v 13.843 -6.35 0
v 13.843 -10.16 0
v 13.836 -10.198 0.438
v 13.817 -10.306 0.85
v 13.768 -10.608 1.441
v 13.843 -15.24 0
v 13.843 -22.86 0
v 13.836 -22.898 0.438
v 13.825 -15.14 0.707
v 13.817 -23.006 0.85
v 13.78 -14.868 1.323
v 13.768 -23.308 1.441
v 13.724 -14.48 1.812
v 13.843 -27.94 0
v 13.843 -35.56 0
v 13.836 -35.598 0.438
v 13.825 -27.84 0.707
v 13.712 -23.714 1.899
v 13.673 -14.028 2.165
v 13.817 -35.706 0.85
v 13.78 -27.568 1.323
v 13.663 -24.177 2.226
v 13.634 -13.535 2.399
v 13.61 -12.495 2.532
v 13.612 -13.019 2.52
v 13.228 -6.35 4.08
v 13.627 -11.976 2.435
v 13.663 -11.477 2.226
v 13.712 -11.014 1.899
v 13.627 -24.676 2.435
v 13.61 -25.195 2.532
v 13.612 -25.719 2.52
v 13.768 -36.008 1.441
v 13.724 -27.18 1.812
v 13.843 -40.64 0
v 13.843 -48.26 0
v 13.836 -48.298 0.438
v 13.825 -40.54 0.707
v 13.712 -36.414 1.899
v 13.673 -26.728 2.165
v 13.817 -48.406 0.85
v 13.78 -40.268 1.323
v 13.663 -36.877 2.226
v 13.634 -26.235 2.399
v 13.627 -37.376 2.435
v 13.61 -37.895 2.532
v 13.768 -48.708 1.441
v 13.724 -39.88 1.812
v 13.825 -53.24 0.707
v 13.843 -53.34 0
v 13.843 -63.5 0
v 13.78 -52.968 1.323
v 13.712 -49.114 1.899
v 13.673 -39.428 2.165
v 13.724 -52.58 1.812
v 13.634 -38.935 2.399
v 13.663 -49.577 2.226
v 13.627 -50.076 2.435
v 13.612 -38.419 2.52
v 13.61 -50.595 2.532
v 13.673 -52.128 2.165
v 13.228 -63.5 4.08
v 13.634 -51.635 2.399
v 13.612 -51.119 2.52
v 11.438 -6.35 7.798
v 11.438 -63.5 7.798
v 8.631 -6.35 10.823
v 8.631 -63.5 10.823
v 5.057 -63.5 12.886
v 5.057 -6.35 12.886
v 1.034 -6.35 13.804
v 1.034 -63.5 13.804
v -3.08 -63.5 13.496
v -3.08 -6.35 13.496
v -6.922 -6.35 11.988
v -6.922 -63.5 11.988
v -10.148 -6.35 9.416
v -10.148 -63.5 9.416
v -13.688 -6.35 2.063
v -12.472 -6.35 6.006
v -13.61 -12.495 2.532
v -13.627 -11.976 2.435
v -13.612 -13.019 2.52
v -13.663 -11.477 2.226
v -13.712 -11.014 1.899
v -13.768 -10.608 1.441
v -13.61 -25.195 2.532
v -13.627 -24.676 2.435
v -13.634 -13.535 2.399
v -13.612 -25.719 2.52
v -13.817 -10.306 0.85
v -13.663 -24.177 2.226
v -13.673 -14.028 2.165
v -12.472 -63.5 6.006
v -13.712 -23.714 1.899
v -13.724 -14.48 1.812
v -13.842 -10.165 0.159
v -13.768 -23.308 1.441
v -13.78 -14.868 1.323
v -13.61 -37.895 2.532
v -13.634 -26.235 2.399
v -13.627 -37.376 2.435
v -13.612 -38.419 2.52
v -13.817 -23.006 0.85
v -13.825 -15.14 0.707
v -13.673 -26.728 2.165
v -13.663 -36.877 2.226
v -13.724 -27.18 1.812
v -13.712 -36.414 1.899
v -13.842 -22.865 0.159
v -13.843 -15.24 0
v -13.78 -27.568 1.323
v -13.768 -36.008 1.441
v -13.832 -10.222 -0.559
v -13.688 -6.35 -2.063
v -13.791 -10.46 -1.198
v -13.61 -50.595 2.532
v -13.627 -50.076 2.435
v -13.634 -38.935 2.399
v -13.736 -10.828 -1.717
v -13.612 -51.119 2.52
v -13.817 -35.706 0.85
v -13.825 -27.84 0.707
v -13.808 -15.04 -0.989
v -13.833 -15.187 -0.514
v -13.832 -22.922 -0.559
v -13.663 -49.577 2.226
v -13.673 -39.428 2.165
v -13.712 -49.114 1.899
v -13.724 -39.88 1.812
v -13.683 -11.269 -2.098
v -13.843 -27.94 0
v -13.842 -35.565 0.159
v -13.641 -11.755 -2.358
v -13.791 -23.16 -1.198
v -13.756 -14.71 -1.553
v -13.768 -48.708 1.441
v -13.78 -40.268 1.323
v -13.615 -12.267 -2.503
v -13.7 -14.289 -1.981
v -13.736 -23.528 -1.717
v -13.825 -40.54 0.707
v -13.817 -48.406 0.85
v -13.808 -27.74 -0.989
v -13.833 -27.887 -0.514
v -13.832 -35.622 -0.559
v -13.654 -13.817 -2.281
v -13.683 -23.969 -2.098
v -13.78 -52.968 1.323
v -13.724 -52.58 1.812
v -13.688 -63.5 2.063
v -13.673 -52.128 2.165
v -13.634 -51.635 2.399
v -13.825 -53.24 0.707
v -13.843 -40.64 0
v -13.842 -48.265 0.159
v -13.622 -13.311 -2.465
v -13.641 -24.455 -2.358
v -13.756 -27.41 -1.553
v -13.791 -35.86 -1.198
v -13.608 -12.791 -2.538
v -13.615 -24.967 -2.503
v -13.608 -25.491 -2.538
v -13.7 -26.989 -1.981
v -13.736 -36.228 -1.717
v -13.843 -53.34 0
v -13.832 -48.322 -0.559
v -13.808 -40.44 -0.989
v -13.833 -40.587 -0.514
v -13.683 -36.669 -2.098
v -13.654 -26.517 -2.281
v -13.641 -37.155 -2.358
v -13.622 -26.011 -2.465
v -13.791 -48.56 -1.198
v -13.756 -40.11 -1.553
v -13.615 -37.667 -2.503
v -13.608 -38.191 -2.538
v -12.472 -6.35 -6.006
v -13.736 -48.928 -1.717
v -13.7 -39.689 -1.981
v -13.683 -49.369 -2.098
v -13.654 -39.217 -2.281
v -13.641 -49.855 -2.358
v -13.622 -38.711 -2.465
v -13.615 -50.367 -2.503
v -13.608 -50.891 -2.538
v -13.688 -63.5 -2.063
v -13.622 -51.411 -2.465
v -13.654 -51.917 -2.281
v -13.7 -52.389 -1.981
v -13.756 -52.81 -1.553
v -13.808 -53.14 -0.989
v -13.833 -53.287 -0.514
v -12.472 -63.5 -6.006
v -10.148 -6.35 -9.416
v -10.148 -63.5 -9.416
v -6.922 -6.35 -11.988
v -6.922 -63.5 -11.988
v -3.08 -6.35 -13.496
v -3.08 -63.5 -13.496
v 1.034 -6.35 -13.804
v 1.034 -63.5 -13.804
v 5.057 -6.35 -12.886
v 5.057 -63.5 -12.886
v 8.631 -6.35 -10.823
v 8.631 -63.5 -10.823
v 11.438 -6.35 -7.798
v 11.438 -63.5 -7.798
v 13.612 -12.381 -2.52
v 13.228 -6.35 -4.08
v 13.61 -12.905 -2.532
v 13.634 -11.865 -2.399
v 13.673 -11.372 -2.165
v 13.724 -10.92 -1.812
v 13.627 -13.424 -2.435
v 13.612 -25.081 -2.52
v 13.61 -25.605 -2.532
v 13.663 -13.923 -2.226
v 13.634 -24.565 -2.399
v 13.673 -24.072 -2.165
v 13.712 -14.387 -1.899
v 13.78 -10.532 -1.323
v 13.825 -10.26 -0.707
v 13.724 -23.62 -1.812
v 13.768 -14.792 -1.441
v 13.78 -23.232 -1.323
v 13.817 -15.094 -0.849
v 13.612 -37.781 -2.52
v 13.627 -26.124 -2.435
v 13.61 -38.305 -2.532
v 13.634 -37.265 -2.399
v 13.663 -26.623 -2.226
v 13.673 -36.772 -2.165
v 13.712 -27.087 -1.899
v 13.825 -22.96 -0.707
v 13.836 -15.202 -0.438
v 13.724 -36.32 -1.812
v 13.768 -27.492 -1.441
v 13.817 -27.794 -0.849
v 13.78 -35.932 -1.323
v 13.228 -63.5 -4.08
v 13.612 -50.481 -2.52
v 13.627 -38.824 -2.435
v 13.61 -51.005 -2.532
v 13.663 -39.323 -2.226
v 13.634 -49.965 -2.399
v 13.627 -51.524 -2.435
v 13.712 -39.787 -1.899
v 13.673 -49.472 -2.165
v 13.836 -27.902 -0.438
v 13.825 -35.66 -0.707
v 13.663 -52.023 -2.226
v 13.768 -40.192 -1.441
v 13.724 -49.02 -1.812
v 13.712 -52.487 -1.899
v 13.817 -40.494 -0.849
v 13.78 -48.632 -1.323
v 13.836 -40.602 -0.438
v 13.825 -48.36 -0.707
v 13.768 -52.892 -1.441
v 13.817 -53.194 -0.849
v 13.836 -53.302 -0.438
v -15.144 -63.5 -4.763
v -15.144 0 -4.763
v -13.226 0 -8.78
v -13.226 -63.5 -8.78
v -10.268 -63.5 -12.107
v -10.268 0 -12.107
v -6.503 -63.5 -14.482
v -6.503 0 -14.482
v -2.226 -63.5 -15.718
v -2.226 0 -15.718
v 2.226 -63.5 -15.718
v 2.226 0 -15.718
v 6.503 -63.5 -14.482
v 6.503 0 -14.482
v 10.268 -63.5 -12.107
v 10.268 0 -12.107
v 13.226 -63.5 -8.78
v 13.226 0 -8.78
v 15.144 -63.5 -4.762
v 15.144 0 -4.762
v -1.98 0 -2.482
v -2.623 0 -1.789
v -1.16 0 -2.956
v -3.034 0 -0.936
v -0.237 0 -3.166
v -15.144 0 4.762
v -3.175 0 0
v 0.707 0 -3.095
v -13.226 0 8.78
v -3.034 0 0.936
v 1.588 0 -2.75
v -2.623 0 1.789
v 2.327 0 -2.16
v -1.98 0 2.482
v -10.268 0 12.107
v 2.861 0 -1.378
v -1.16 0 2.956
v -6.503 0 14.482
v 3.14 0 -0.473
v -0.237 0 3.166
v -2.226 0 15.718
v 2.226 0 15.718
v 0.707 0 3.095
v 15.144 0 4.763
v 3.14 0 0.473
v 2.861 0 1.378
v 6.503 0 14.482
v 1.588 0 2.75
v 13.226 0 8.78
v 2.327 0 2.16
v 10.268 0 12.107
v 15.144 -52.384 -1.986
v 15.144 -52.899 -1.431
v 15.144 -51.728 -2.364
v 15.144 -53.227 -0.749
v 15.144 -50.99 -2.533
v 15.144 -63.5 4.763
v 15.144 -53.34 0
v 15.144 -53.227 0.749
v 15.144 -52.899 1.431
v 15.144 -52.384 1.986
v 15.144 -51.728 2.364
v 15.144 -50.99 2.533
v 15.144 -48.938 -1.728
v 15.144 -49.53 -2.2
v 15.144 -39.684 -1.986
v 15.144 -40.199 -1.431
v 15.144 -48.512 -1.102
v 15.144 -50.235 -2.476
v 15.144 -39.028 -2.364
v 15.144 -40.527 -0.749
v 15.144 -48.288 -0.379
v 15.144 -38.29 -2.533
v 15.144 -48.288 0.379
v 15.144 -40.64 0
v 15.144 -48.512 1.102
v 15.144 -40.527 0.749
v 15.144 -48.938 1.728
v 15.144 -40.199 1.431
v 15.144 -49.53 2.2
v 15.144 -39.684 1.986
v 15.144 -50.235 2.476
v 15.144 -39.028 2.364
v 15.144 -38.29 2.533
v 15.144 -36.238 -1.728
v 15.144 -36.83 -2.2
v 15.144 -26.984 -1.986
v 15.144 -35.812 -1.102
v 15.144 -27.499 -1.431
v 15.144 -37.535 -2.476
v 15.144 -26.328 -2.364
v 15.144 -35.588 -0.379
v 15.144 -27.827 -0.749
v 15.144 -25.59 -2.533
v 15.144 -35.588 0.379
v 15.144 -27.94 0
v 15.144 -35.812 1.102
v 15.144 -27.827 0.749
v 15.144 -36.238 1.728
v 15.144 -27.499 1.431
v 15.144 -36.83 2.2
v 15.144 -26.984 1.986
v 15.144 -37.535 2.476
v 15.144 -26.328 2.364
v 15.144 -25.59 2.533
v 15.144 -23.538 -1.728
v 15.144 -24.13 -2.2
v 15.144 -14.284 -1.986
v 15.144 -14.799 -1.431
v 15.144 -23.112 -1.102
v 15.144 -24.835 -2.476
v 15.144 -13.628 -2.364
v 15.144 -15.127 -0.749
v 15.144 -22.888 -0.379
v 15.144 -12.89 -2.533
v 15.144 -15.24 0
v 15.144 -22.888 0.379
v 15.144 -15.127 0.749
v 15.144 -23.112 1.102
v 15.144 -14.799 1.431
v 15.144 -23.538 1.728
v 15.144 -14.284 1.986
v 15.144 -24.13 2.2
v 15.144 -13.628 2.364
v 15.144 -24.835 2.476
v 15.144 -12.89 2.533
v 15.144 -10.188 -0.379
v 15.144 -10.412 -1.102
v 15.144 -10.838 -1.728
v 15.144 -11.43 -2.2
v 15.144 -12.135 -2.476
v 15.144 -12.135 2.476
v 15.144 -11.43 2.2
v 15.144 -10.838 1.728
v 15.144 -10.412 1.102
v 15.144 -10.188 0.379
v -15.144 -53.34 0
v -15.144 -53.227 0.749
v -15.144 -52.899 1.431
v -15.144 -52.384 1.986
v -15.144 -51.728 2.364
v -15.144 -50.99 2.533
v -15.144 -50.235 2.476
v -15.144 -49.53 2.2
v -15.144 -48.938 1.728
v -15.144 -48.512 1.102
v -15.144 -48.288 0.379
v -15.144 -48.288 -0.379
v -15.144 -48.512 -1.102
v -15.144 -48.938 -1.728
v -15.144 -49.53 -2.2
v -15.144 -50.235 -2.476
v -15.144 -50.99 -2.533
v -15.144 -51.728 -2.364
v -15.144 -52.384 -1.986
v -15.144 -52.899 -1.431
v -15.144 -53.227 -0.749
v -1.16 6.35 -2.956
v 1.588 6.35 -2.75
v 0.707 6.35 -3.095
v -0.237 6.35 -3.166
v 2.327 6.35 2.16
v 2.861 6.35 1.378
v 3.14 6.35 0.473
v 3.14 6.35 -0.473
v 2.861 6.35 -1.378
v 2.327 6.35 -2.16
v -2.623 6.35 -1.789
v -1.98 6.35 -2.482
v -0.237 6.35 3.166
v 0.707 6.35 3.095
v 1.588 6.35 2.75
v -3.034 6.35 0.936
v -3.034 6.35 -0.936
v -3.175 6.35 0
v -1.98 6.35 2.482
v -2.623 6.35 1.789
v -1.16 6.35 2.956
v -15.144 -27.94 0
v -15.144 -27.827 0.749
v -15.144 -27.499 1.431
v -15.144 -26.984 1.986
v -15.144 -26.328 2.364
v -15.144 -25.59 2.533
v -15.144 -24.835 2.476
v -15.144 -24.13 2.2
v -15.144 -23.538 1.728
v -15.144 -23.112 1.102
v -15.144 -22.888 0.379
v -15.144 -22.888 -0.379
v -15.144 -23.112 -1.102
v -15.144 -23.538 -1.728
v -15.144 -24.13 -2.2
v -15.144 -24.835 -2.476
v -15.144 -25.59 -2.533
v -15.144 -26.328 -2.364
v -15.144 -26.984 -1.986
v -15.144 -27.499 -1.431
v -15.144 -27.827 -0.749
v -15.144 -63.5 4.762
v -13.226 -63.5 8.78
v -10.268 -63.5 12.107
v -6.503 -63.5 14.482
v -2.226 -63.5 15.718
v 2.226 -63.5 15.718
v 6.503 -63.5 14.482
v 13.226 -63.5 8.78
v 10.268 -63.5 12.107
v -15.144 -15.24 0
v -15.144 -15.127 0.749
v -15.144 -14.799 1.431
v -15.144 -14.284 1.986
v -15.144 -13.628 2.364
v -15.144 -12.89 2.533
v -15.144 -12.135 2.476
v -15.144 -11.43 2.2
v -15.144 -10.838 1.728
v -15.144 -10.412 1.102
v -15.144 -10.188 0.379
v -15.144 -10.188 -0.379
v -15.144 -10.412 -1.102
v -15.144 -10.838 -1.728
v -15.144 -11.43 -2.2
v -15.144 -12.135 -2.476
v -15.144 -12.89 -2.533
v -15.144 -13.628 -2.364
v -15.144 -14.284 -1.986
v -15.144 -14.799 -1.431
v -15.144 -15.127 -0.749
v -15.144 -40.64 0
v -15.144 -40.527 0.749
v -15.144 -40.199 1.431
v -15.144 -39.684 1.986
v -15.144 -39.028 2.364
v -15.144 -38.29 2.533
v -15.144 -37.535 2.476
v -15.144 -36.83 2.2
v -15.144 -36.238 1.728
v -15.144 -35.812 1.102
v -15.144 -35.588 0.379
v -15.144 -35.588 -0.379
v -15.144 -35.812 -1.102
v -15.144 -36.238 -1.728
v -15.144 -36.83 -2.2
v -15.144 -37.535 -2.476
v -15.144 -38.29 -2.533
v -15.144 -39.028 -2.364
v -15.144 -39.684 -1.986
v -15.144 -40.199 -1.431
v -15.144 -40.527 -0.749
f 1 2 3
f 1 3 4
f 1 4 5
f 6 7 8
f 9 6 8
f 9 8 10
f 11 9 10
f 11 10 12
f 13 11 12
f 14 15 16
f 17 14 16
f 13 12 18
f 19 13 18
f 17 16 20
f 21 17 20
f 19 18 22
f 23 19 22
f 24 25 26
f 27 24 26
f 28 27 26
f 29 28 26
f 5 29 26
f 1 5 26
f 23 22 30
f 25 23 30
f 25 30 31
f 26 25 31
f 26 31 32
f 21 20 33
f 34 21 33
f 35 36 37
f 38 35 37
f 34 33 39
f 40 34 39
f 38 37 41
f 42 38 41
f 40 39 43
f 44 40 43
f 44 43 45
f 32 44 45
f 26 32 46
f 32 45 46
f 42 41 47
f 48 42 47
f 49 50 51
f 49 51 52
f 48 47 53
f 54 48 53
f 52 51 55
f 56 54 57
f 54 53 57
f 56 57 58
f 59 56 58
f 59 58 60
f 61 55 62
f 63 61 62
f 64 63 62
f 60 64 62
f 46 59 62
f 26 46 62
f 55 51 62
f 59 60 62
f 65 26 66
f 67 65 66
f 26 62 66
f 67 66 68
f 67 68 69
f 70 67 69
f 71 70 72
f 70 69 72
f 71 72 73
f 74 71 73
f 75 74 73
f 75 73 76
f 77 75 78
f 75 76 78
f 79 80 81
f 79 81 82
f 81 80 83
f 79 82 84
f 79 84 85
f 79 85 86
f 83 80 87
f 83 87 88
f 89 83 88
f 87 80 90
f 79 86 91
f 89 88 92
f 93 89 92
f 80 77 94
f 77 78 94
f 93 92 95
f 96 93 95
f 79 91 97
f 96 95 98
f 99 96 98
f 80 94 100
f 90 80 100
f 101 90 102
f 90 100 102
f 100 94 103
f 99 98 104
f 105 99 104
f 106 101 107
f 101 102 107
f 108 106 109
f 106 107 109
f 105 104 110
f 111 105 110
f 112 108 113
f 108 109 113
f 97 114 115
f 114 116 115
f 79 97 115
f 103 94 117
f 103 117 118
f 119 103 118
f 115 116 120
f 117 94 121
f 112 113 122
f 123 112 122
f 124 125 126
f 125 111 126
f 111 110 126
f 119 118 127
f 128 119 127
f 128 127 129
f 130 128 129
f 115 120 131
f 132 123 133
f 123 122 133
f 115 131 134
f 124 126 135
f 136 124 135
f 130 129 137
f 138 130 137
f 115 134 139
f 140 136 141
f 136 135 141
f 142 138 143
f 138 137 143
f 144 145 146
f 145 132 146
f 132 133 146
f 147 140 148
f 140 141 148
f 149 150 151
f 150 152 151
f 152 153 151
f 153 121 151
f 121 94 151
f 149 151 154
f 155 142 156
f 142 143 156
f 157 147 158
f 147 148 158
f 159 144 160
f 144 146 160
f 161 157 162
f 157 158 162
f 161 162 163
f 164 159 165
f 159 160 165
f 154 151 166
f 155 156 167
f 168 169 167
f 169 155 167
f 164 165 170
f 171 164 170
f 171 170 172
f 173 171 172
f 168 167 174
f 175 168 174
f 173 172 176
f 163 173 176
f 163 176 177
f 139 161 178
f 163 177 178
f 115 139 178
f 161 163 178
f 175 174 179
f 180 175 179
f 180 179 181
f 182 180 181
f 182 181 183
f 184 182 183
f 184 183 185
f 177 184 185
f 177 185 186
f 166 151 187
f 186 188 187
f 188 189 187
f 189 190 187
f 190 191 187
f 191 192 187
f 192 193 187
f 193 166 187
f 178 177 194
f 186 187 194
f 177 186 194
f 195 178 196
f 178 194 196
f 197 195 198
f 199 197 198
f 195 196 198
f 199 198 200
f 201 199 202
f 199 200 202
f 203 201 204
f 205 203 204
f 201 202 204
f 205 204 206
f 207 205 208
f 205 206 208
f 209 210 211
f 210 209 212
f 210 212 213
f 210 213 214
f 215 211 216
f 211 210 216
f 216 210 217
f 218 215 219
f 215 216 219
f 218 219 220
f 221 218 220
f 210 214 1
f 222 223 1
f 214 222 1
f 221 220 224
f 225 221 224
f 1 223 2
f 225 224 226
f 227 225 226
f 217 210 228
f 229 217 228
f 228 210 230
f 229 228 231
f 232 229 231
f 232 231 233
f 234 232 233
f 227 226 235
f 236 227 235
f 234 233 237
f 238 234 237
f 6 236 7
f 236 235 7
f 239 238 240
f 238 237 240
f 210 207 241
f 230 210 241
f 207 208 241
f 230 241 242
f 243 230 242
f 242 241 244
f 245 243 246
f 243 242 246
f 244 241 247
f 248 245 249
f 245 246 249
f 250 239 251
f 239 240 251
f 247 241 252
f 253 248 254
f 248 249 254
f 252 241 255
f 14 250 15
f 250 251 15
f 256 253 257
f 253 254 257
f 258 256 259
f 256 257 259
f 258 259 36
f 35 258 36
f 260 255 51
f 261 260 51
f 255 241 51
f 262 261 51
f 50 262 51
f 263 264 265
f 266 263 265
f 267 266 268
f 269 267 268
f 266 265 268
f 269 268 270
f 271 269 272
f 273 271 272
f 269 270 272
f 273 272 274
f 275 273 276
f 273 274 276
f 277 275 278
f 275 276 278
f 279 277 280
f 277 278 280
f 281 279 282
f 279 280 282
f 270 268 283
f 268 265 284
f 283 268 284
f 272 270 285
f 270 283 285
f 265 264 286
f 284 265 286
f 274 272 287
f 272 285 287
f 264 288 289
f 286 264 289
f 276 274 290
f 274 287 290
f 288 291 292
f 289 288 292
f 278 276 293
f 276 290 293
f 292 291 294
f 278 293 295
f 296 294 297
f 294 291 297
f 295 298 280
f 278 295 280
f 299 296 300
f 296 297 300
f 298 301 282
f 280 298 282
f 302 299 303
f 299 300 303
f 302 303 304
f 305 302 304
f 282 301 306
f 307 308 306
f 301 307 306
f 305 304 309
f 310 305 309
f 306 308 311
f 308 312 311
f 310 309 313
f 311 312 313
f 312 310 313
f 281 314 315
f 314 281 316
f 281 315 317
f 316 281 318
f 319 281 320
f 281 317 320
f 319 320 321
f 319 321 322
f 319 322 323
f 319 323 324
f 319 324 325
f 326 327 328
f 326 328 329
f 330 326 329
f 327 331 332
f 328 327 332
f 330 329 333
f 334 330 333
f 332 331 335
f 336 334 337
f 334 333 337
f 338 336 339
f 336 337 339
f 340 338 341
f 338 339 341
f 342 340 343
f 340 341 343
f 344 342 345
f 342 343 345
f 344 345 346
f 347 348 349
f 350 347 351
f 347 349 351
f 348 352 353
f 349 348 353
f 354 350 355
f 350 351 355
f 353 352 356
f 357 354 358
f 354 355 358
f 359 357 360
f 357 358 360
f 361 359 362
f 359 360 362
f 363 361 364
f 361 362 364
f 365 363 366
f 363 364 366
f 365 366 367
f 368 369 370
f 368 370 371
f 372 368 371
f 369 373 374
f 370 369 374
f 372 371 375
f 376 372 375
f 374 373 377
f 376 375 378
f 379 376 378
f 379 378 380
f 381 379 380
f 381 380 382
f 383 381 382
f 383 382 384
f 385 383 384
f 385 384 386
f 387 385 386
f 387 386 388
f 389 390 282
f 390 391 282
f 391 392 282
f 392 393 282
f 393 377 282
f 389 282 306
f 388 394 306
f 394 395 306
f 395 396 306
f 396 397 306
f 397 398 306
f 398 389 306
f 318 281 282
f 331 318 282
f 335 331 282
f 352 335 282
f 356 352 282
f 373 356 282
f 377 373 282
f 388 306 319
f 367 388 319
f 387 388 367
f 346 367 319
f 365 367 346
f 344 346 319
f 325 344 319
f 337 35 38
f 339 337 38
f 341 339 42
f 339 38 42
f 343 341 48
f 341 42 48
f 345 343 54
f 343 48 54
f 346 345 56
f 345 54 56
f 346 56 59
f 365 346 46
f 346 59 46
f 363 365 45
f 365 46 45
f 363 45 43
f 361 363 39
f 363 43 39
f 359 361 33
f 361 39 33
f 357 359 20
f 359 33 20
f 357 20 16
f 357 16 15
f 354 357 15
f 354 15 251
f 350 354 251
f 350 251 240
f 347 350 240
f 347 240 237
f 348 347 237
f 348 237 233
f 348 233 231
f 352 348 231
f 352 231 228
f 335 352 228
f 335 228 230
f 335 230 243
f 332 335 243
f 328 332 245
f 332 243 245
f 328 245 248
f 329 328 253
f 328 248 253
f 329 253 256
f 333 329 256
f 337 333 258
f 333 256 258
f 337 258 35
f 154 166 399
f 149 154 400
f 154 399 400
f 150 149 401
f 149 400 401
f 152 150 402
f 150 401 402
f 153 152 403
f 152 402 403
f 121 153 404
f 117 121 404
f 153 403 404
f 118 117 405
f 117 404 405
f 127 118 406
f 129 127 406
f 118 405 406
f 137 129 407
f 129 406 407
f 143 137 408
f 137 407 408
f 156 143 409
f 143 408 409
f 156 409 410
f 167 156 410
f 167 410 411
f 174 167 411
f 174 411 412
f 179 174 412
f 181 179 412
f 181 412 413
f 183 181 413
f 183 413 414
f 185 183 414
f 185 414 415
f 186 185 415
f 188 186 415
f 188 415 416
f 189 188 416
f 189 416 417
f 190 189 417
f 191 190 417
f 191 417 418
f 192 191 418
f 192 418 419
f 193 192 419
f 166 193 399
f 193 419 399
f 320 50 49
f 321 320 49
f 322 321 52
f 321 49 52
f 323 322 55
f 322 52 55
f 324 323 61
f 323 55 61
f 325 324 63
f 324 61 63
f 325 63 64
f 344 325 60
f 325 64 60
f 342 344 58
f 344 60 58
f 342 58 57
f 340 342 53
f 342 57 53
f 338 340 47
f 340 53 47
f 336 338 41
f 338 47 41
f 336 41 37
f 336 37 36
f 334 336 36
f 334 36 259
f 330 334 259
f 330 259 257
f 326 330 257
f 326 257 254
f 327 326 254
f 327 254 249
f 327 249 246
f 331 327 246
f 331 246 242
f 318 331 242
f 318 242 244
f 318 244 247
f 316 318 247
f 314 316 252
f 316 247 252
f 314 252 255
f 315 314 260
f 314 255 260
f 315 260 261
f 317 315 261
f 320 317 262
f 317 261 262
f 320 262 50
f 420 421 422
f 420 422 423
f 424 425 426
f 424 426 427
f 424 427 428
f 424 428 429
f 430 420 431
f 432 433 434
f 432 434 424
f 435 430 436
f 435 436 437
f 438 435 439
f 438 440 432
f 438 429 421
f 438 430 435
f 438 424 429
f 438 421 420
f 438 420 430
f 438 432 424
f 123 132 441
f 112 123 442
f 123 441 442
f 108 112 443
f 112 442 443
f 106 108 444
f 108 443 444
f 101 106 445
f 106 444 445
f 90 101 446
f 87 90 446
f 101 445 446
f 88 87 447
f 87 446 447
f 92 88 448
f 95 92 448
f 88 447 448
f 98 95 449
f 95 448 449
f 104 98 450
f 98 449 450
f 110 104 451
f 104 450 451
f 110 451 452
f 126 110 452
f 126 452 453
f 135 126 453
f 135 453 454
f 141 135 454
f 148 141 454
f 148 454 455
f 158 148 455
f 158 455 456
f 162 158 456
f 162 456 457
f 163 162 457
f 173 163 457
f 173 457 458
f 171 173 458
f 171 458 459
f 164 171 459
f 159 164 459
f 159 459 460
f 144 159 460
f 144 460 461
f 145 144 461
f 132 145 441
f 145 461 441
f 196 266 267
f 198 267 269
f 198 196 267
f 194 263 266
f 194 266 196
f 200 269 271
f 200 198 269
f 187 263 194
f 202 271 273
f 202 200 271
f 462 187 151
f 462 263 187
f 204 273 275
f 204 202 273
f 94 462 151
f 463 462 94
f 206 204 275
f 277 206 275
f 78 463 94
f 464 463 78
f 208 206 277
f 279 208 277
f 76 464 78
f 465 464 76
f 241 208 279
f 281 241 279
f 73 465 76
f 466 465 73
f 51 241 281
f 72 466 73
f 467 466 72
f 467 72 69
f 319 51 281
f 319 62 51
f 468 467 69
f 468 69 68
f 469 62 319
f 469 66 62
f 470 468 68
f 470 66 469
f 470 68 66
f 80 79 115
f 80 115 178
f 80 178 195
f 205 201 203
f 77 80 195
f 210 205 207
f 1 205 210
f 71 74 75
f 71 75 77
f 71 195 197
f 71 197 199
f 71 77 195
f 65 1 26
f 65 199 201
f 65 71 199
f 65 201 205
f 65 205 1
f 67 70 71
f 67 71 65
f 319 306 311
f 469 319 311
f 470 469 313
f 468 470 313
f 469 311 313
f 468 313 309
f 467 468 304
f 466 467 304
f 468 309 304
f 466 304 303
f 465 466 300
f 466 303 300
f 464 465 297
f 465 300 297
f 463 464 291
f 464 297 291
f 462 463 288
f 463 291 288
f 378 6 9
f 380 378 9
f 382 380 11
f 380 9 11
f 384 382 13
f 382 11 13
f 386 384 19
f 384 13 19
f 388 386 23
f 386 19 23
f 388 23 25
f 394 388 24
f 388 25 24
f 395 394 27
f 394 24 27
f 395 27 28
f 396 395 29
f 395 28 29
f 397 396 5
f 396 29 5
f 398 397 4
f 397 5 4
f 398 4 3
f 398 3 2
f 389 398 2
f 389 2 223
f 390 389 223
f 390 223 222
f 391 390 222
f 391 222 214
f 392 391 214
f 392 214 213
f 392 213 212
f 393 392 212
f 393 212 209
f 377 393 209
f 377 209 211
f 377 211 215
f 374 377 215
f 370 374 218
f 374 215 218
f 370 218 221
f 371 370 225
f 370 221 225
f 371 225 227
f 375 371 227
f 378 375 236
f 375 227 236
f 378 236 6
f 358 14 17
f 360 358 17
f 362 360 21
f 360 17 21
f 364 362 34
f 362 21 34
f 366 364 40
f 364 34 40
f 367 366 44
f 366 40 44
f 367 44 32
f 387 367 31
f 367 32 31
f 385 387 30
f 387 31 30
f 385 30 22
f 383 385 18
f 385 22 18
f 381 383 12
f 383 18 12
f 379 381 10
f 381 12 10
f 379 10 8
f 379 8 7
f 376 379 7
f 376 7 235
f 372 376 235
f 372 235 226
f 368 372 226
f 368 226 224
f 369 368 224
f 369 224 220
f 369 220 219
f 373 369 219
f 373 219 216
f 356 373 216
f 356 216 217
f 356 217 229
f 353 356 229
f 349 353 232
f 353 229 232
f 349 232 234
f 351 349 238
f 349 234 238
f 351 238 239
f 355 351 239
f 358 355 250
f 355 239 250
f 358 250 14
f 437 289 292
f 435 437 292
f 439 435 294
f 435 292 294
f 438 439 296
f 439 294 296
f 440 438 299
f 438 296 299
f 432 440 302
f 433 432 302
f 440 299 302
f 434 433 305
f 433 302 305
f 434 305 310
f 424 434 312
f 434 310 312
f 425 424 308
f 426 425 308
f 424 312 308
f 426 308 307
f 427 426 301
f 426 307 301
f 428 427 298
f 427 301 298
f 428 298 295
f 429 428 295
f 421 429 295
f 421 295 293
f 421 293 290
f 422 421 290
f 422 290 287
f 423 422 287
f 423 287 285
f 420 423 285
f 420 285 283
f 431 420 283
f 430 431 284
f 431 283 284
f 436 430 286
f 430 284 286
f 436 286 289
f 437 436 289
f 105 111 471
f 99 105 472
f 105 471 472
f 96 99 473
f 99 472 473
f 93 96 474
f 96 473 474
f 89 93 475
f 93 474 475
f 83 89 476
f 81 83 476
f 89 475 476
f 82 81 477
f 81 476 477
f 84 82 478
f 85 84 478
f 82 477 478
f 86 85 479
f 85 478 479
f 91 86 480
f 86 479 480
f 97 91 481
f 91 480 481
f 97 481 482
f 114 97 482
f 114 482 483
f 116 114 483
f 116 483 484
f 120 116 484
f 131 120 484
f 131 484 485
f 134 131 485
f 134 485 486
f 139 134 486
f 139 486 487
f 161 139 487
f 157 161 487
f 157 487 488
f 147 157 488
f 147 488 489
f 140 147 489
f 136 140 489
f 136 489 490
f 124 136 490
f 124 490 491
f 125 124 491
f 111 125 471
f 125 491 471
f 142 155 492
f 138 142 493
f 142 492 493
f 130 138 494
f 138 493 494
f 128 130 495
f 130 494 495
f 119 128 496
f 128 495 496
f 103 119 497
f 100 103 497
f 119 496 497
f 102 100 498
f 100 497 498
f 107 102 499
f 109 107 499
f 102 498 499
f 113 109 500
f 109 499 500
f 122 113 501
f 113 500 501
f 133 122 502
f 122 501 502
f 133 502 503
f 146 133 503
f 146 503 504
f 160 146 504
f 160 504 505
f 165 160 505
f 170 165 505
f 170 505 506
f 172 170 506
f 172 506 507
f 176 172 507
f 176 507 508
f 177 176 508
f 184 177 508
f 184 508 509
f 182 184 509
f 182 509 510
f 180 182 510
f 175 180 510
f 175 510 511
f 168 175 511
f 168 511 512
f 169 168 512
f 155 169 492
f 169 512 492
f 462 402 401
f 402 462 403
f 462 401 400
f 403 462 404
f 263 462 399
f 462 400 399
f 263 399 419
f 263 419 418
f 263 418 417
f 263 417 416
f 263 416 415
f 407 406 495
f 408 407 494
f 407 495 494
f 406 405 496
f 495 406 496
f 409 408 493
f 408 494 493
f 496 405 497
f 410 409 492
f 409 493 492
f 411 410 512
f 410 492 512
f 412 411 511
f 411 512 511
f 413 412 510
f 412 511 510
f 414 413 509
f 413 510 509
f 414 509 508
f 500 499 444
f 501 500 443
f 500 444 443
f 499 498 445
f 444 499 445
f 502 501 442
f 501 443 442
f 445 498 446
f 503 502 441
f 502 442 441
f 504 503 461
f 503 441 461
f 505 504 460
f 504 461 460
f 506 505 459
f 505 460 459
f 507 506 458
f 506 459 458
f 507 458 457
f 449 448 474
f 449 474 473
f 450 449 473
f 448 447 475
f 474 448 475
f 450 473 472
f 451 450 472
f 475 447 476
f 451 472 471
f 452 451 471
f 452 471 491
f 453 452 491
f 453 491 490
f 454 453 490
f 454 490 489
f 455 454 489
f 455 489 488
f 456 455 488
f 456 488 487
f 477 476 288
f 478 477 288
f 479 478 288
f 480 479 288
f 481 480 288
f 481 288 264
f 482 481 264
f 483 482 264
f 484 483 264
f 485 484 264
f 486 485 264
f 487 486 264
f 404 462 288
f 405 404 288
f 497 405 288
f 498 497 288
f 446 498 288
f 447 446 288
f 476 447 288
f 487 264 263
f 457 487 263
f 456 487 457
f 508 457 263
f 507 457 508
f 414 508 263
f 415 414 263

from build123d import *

# Parameters (mm, degrees)
F1_DEPTH = 63.5
F2_R     = 13.843
F3_DEPTH = 57.15
F4_R     = 3.175
F5_DEPTH = 6.35
F6_R     = 2.54
F7_DEPTH = 30.28857


with BuildPart() as f1:
    # F0 (on Front) → F1 (new body)
    with BuildSketch(Plane.XZ):
        with BuildLine():
            Line((15.143785, -4.7625), (15.143785, 4.7625))
            ThreePointArc((15.143785, 4.7625), (0, 15.875), (-15.143785, 4.7625))
            Line((-15.143785, 4.7625), (-15.143785, -4.7625))
            ThreePointArc((-15.143785, -4.7625), (0, -15.875), (15.143785, -4.7625))
        make_face()
    extrude(amount=F1_DEPTH)

    # F2 (on face) → F3 (cut)
    with BuildSketch(Plane.XZ.offset(63.5)):
        Circle(F2_R)
    extrude(amount=-F3_DEPTH, mode=Mode.SUBTRACT)

    # F4 (on face) → F5 (join)
    with BuildSketch(Plane(origin=(0, 0, 0), x_dir=(-1, 0, 0), z_dir=(0, 1, 0))):
        Circle(F4_R)
    extrude(amount=F5_DEPTH)

    # F6 (on face) → F7 (cut, through all)
    with BuildSketch(Plane(origin=(-15.143785, 0, 0), x_dir=(0, -1, 0), z_dir=(-1, 0, 0))):
        with Locations((12.7, 0)):
            Circle(F6_R)
        with Locations((50.8, 0)):
            Circle(F6_R)
        with Locations((25.4, 0)):
            Circle(F6_R)
        with Locations((38.1, 0)):
            Circle(F6_R)
    extrude(amount=-F7_DEPTH, mode=Mode.SUBTRACT)


solid = f1.part
